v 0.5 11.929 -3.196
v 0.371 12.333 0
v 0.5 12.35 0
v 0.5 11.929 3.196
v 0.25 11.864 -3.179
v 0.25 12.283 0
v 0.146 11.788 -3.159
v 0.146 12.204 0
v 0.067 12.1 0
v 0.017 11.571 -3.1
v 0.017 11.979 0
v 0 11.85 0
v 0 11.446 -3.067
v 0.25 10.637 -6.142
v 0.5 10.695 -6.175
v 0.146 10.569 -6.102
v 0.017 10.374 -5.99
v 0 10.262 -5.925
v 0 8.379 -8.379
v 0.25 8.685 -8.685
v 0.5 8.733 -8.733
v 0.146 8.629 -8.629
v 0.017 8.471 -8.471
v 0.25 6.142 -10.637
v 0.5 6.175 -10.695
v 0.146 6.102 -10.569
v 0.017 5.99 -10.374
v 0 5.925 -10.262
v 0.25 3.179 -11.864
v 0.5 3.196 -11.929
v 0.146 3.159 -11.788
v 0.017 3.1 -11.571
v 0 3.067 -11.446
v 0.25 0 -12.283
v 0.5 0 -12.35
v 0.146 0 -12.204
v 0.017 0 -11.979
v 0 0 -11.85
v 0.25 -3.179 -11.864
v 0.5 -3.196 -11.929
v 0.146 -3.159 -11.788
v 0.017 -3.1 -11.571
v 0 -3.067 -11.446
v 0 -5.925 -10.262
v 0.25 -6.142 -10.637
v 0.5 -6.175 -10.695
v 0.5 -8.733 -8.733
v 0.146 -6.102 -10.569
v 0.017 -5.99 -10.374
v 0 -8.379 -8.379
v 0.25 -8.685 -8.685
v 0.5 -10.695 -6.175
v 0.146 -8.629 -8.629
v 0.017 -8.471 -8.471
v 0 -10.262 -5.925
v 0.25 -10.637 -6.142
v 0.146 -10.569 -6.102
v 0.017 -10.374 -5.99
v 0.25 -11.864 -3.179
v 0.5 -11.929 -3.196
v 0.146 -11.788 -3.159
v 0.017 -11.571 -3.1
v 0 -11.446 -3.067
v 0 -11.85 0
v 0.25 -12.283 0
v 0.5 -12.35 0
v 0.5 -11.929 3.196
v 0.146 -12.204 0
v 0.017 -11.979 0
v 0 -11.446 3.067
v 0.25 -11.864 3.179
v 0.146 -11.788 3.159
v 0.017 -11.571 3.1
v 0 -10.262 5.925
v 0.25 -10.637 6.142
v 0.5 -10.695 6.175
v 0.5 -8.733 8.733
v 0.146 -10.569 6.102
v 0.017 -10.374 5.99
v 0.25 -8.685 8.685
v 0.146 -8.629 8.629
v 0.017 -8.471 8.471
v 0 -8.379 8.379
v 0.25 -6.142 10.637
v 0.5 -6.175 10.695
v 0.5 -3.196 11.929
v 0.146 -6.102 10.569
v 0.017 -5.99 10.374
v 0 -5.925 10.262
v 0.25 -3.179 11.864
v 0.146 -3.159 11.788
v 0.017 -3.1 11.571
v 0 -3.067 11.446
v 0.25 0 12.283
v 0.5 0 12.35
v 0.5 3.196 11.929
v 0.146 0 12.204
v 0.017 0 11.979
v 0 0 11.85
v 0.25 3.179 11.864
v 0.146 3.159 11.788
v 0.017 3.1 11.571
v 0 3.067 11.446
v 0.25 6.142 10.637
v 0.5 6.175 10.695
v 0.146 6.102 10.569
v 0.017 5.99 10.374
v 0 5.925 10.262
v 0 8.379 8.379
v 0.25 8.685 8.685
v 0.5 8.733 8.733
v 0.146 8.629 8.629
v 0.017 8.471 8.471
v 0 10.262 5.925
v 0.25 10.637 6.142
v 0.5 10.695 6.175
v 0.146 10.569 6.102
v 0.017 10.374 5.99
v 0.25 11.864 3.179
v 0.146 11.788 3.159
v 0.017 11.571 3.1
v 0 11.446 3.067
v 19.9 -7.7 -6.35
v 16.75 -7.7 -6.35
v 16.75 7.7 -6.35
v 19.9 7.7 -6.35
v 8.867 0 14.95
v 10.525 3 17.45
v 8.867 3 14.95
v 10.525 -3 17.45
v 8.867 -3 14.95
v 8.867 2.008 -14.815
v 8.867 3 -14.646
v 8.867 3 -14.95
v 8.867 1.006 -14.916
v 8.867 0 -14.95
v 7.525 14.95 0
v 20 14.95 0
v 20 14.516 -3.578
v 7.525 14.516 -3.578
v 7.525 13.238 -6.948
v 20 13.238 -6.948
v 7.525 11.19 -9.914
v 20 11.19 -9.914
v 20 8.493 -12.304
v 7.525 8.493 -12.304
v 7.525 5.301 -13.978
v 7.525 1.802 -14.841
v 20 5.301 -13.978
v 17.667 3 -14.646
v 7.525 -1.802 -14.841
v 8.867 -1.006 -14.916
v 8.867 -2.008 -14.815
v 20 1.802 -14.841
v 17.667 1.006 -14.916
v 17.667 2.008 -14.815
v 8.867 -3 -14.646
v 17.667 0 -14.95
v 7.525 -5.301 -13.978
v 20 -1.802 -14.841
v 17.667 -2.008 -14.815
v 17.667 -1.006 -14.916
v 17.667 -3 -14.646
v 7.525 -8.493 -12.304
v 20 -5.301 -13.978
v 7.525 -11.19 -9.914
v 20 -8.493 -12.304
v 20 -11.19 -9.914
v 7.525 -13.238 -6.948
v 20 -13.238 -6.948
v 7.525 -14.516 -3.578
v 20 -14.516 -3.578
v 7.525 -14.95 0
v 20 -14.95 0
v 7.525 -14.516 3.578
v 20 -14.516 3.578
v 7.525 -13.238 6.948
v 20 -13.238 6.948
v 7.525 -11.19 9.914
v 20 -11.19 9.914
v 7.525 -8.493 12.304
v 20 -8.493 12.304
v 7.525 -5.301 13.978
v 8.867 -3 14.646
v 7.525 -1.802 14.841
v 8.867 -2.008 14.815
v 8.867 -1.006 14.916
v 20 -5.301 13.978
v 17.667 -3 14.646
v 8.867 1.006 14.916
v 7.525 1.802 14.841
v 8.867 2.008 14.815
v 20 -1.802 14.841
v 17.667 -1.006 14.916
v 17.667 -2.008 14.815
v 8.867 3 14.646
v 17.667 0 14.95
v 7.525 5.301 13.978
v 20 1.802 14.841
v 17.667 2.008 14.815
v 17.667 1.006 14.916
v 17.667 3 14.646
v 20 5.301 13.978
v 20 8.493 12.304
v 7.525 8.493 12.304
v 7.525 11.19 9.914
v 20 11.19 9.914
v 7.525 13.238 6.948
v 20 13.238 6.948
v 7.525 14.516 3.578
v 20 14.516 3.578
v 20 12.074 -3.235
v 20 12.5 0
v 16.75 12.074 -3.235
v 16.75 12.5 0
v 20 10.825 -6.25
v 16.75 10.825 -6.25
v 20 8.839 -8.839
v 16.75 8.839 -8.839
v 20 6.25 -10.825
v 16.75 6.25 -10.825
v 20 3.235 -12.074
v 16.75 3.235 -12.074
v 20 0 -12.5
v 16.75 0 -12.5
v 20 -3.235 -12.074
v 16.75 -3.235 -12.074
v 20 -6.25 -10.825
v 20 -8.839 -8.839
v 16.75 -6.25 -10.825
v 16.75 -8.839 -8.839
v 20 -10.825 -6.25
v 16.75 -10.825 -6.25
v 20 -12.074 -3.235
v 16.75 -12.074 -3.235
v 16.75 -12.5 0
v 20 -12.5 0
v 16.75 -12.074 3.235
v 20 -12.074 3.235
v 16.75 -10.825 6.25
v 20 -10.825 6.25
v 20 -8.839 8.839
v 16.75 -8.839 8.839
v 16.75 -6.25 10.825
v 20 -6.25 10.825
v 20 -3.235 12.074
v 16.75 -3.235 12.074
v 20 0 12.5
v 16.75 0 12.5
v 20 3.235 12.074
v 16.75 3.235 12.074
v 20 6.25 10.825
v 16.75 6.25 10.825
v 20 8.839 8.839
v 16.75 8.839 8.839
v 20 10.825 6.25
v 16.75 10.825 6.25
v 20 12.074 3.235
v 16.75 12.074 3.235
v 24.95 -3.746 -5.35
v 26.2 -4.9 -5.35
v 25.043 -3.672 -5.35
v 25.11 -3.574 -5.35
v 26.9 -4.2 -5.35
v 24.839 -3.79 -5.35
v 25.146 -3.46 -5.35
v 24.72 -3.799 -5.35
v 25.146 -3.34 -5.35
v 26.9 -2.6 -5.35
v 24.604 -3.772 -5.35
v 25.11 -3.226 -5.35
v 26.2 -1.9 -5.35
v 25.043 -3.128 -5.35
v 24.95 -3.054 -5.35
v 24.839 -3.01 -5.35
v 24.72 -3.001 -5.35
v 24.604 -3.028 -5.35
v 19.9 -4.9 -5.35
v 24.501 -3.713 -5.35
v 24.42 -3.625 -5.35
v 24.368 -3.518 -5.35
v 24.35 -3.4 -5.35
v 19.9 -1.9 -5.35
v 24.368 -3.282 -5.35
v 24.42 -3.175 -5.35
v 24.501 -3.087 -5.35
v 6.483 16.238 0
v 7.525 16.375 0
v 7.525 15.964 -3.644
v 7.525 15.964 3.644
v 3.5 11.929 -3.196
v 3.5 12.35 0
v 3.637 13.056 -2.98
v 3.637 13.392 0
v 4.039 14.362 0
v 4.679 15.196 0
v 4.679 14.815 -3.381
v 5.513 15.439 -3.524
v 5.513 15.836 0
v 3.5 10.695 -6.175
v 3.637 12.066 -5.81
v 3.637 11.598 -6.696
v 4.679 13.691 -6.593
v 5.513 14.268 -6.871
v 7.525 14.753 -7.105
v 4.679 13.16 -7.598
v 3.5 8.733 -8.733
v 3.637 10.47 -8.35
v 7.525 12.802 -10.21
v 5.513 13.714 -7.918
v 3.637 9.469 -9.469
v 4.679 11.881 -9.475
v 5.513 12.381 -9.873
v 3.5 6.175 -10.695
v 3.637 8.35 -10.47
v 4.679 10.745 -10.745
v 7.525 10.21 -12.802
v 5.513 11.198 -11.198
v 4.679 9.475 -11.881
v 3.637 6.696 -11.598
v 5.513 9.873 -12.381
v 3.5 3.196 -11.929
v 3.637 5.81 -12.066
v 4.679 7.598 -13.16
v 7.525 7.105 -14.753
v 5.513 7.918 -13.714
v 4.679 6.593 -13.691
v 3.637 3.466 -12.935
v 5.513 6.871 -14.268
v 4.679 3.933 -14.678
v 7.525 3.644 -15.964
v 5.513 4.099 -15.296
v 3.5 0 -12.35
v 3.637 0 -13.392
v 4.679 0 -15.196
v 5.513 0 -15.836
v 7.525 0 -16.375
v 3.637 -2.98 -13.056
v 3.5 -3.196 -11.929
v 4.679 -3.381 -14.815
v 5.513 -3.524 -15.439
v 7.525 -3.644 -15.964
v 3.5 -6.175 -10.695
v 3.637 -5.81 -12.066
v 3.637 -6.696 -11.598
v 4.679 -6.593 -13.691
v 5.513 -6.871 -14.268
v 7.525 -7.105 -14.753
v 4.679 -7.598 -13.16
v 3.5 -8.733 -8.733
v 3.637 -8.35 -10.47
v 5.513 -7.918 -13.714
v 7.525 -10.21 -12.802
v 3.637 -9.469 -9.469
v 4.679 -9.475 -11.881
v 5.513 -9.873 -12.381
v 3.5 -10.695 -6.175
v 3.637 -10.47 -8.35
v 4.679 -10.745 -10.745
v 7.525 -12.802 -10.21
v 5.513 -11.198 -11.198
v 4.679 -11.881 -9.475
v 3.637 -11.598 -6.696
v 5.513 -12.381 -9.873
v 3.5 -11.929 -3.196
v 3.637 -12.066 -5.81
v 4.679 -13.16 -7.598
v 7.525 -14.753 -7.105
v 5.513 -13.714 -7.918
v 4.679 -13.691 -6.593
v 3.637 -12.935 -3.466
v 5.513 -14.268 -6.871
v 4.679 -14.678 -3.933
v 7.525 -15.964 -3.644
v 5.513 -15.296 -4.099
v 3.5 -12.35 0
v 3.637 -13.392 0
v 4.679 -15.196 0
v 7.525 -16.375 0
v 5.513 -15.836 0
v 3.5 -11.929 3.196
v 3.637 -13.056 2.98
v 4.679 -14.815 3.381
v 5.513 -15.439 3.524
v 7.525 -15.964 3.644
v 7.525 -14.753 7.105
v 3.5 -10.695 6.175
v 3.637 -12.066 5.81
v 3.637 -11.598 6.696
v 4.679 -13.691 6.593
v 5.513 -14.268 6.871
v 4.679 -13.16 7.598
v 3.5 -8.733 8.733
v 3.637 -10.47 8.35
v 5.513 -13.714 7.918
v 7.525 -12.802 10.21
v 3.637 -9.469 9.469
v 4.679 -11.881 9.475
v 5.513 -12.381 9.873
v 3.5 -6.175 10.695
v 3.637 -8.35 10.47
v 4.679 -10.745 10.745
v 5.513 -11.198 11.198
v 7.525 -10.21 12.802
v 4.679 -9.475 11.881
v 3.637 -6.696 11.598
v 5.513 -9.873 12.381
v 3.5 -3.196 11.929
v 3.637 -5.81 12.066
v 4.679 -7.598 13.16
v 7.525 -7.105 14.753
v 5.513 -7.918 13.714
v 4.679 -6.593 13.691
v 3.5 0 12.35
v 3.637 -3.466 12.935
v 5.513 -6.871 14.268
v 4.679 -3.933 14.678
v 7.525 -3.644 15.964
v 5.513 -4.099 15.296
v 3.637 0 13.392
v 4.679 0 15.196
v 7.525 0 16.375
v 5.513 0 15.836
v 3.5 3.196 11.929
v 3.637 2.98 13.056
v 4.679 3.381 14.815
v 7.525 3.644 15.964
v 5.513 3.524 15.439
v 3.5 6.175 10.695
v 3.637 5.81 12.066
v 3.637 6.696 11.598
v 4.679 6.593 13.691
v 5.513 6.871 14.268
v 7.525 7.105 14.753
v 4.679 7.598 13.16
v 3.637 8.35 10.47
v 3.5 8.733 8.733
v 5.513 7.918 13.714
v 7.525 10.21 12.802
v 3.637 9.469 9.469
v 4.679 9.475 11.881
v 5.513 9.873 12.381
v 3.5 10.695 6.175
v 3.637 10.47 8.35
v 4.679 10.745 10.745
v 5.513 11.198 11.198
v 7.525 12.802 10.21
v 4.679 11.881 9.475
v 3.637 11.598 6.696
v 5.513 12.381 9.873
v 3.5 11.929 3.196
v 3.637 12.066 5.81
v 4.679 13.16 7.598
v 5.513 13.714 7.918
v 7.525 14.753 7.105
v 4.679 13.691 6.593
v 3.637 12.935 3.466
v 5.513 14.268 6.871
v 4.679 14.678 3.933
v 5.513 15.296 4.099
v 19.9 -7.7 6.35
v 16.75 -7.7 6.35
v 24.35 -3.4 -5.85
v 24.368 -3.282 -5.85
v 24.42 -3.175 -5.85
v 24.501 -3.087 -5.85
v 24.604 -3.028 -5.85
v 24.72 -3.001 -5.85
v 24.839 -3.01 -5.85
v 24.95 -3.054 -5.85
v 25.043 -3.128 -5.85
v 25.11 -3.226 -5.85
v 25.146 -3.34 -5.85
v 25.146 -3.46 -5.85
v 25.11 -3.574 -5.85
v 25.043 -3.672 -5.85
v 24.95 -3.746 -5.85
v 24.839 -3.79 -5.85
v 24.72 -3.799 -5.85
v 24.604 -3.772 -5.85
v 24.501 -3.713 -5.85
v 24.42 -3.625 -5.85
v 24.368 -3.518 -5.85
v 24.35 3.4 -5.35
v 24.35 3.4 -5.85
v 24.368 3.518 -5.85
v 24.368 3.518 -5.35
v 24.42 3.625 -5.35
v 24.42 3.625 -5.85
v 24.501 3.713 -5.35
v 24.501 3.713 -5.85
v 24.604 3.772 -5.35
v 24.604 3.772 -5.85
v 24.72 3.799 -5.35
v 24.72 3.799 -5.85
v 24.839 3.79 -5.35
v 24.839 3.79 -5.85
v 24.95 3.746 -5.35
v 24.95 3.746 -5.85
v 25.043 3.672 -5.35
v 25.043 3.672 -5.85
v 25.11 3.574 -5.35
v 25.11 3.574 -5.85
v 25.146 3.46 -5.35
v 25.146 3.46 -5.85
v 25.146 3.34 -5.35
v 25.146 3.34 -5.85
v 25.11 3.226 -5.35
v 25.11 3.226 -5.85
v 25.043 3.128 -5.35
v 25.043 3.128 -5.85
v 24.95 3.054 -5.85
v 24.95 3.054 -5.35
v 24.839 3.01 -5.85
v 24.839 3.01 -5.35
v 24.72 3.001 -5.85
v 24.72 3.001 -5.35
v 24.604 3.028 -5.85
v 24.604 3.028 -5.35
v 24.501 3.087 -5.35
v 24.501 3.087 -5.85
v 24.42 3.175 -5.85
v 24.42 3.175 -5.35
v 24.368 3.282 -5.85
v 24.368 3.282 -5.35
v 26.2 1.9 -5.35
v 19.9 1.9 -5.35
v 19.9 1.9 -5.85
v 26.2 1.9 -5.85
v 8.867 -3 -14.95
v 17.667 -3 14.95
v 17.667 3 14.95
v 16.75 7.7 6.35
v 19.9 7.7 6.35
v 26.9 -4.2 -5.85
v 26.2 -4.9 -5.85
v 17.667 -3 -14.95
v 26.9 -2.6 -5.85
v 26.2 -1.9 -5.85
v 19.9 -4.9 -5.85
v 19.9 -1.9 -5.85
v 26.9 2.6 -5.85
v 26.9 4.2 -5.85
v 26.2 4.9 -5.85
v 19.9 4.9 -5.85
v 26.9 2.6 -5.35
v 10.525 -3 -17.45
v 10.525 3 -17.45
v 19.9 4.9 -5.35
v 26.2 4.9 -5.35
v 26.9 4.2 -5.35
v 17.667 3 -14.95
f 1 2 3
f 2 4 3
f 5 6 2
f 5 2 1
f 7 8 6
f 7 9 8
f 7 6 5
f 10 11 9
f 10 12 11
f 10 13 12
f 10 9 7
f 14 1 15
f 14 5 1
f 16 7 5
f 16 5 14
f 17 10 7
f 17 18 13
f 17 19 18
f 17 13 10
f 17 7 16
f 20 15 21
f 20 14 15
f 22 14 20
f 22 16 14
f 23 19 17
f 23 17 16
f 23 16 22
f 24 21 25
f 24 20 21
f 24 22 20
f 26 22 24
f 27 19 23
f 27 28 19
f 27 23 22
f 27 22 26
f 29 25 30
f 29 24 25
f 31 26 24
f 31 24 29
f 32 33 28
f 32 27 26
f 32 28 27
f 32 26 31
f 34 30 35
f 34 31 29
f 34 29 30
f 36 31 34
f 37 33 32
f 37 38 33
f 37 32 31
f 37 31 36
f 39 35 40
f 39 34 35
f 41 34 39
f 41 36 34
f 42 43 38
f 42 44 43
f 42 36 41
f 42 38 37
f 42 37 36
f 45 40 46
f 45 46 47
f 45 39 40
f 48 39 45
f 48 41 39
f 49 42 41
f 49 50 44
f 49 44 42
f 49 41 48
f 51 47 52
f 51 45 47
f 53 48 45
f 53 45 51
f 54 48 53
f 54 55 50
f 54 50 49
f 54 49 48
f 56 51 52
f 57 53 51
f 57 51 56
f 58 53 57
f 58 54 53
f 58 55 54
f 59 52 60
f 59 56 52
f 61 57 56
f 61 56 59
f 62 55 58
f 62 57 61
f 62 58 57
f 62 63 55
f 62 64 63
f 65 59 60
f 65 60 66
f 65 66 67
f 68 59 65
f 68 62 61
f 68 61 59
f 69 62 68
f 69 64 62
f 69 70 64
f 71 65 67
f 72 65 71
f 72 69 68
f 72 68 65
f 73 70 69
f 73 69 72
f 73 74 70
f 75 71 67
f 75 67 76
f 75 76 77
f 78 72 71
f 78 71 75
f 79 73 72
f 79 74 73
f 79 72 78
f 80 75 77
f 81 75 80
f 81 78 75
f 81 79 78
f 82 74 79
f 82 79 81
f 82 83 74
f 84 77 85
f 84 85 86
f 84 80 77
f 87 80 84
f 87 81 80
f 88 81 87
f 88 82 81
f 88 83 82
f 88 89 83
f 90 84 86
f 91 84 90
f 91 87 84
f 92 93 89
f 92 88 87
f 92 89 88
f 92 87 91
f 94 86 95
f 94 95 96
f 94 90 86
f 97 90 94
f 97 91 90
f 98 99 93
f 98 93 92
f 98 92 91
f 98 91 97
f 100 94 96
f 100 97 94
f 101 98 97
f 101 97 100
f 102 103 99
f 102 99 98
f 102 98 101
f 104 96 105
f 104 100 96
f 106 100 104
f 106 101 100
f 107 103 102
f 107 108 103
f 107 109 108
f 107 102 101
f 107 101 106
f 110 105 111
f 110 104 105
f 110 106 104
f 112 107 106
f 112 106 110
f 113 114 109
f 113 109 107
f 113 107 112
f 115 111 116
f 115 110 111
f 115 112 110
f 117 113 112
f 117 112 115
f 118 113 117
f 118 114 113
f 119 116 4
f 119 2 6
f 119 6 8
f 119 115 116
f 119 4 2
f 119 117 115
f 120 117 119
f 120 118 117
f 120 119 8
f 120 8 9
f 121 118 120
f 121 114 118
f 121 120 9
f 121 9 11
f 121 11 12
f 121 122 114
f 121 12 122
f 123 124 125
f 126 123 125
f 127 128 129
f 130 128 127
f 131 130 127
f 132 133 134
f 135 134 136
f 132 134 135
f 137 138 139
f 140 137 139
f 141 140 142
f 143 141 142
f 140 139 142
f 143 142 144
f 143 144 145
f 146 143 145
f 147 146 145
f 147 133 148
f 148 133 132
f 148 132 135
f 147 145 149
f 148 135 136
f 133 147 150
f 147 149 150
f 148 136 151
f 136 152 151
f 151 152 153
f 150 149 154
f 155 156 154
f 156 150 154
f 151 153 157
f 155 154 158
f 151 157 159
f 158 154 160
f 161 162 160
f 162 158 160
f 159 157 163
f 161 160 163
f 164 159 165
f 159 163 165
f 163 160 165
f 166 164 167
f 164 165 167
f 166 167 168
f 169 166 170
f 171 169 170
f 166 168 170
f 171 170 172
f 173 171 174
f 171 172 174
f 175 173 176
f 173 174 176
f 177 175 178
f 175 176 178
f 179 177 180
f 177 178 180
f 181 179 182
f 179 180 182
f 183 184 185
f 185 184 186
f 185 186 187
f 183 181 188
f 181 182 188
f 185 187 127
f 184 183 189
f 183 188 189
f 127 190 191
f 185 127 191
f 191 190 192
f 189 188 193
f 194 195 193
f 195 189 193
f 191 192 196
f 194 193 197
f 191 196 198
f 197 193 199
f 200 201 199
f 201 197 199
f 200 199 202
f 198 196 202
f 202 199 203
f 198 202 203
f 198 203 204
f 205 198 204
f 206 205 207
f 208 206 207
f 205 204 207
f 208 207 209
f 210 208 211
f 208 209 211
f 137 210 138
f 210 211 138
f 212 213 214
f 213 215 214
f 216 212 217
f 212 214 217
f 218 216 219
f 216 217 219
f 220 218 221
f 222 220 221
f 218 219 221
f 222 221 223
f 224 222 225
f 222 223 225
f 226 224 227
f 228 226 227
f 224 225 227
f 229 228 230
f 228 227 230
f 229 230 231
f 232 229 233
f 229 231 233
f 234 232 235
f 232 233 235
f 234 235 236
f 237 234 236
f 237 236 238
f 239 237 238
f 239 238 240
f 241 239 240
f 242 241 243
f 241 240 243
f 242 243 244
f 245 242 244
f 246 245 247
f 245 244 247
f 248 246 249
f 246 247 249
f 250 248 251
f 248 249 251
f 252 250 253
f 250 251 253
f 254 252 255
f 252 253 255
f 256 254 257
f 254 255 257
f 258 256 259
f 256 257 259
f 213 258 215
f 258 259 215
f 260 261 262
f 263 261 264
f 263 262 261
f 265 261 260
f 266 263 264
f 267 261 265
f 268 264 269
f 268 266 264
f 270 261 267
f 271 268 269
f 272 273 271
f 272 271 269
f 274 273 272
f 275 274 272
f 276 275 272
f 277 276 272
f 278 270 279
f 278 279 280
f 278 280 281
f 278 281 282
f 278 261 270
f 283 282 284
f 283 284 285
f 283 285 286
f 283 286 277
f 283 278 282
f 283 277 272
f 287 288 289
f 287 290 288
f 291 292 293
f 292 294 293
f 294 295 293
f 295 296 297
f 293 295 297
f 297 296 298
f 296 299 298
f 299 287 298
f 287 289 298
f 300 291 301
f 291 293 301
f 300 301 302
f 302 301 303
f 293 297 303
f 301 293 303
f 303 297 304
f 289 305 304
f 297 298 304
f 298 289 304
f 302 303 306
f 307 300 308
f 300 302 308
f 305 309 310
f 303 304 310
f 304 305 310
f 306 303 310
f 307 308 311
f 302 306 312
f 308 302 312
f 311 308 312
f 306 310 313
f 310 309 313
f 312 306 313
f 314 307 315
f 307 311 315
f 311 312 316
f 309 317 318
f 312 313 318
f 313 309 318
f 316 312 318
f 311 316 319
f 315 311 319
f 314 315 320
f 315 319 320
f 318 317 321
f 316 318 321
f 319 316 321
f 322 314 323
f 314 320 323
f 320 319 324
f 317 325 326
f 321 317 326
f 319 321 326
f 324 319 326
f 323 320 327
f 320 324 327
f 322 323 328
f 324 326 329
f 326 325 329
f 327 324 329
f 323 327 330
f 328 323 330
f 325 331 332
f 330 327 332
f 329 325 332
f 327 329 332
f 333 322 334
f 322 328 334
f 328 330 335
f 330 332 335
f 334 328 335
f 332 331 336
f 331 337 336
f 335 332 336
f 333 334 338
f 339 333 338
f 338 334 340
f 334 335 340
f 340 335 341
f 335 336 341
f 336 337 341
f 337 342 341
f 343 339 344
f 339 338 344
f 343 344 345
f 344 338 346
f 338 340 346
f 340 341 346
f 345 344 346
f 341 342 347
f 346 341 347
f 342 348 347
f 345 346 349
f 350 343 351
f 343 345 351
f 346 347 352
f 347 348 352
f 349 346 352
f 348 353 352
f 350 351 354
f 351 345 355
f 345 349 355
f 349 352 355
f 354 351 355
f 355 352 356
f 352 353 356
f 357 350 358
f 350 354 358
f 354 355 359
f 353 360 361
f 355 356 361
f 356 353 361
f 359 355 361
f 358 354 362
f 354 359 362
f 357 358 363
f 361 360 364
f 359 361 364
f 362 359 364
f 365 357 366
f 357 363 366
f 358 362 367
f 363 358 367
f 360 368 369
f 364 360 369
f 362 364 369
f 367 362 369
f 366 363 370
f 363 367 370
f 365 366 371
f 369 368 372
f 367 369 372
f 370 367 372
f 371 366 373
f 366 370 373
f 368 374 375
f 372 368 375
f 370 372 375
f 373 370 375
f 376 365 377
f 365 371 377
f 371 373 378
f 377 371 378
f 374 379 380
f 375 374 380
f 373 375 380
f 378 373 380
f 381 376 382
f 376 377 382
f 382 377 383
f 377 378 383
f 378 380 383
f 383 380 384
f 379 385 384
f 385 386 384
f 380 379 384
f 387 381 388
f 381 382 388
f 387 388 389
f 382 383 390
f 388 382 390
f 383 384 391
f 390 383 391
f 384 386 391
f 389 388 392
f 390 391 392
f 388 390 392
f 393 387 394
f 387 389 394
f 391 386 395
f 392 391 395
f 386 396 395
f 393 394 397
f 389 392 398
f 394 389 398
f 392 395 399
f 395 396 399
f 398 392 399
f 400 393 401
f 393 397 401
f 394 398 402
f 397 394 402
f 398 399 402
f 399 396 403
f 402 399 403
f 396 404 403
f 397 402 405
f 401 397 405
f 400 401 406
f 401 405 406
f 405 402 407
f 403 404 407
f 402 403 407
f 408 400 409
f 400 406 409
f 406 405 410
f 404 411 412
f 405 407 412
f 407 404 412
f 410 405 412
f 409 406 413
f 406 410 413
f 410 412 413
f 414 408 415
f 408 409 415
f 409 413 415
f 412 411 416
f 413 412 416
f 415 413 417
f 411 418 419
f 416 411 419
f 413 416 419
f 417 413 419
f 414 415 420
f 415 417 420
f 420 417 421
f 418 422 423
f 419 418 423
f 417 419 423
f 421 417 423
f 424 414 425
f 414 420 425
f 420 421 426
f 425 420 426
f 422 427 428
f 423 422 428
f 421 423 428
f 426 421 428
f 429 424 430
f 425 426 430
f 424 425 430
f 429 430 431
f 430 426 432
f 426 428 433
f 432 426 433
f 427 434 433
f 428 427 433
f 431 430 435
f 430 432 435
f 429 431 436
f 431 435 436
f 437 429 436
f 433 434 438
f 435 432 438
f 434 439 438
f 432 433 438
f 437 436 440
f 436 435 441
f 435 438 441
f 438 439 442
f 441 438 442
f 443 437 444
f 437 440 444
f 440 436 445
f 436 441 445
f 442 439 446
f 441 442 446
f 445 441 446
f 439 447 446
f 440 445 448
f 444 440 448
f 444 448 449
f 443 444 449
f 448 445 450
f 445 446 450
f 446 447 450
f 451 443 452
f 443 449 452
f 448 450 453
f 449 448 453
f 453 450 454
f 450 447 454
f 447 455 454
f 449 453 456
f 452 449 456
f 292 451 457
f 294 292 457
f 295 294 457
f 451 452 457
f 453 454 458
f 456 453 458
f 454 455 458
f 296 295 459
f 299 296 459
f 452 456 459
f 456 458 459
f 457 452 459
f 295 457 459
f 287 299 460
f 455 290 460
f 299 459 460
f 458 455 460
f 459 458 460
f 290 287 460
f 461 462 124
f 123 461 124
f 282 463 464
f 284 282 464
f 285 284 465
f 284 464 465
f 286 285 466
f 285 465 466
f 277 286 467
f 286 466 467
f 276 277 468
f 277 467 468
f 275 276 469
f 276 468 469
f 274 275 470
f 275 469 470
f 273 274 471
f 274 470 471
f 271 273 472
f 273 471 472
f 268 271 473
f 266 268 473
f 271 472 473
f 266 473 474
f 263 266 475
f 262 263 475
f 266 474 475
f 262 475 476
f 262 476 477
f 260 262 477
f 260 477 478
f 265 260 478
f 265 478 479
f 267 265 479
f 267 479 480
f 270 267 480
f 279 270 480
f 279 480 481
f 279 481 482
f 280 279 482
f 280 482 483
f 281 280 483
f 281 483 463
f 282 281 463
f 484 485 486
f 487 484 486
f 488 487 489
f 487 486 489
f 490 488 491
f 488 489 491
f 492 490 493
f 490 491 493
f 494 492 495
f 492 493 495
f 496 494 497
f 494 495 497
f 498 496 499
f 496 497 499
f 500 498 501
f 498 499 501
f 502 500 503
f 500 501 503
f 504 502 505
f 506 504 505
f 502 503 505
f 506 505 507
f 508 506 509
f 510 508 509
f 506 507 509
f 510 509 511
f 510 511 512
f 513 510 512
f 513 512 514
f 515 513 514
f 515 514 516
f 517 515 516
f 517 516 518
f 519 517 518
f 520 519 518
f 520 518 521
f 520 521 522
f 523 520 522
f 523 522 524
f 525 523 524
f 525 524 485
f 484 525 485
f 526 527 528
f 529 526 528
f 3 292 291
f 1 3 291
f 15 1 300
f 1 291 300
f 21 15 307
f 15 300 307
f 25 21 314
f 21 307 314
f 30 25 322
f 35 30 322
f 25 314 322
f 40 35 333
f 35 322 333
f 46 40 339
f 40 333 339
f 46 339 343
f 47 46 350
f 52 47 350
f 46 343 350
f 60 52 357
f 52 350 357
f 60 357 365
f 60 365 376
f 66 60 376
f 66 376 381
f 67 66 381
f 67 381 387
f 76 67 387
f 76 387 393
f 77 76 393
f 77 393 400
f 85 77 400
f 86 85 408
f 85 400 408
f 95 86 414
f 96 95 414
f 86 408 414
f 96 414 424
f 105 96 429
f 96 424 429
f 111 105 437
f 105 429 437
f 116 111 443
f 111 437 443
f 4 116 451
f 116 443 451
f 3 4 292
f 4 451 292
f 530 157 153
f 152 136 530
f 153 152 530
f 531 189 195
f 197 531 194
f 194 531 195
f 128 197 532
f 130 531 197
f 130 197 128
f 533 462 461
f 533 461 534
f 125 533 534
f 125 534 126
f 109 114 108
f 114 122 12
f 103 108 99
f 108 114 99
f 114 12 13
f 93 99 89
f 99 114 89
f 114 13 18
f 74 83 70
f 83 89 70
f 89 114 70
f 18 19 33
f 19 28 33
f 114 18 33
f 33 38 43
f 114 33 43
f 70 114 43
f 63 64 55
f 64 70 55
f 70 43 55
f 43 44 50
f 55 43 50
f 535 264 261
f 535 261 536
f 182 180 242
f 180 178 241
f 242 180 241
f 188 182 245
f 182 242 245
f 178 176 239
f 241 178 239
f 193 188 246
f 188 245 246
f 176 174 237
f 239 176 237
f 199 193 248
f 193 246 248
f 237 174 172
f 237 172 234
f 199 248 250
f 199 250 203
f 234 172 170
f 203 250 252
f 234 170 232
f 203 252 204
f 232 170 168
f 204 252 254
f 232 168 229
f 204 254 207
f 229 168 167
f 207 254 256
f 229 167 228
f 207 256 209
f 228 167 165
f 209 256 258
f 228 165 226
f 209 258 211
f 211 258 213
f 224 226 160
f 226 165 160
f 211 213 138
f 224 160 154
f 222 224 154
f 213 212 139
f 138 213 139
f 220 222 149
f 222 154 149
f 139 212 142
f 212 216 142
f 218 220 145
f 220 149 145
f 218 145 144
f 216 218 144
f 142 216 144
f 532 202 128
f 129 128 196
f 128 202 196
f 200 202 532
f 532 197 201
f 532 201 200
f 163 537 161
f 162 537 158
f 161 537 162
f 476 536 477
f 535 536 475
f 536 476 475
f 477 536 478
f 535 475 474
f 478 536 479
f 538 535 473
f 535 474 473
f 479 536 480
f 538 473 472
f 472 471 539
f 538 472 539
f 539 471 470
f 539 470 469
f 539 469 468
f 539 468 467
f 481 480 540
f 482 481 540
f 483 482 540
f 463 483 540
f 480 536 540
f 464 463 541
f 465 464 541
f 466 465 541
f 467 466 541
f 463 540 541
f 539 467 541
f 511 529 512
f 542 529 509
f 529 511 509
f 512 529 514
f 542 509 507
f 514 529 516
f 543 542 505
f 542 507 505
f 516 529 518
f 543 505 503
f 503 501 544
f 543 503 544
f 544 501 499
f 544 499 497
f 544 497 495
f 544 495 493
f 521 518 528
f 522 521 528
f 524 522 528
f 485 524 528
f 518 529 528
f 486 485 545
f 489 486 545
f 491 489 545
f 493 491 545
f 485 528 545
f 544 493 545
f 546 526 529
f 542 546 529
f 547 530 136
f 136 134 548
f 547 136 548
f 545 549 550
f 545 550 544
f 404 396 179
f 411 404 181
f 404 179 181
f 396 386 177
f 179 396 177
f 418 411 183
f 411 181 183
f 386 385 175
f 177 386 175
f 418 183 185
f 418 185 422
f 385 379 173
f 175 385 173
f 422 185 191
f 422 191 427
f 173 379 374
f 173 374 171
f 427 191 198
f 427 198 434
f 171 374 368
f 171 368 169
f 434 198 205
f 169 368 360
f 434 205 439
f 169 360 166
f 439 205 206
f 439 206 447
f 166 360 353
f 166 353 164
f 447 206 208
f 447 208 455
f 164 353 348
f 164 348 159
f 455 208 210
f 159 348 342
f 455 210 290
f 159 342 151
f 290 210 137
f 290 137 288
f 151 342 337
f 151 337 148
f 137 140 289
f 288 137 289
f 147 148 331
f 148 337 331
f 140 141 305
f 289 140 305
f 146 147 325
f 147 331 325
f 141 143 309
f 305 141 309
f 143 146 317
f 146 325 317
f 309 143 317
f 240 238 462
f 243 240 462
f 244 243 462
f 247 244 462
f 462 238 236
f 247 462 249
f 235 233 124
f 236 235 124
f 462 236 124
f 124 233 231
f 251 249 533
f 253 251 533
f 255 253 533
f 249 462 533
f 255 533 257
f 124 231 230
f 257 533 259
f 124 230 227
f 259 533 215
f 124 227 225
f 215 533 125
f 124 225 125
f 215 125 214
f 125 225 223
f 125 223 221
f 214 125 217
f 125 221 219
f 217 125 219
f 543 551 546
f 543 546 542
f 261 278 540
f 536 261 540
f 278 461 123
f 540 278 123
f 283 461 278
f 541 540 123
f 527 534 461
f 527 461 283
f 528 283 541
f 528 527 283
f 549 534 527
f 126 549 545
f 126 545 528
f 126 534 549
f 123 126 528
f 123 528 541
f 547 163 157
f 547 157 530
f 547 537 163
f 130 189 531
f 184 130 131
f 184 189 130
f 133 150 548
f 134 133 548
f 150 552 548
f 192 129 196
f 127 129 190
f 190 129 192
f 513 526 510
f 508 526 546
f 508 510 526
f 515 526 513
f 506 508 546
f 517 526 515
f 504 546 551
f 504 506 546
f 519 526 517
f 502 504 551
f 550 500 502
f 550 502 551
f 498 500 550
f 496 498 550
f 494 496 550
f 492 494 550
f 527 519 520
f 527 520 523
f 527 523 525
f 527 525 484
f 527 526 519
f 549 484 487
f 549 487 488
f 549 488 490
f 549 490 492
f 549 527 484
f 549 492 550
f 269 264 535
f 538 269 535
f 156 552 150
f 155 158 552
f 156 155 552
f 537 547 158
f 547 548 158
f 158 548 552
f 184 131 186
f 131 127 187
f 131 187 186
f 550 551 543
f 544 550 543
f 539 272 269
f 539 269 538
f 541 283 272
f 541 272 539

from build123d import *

# Parameters (mm, degrees)
SKETCH2_W           = 12.7
SKETCH2_H           = 15.4
BOSS_EXTRUDE1_DEPTH = 3.15
SKETCH3_W           = 0.5
SKETCH3_H           = 3
BOSS_EXTRUDE2_DEPTH = 7
SKETCH4_R           = 0.4
CUT_EXTRUDE1_DEPTH  = 23.225
CHAMFER1_SIZE       = 0.7
BOSS_EXTRUDE3_DEPTH = 3
FILLET1_R           = 0.5


with BuildPart() as part:
    # Sketch1 → Revolve1 (revolve)
    with BuildSketch(Plane.XY):
        with BuildLine():
            Line((0, 0), (0, 12.35))
            Line((0, 12.35), (3.5, 12.35))
            ThreePointArc((3.5, 12.35), (4.678895206, 15.196104794), (7.525, 16.375))
            Line((7.525, 16.375), (7.525, 14.95))
            Line((7.525, 14.95), (20, 14.95))
            Line((20, 14.95), (20, 12.5))
            Line((20, 12.5), (16.75, 12.5))
            Line((16.75, 12.5), (16.75, 0))
            Line((16.75, 0), (0, 0))
        make_face()
    revolve(axis=Axis((16.75, 0, 0), (-1, 0, 0)))

    # Sketch2 → Boss-Extrude1 (add)
    with BuildSketch(Plane(origin=(16.75, 0, 0), x_dir=(0, 0, -1), z_dir=(1, 0, 0))):
        Rectangle(SKETCH2_W, SKETCH2_H)
    extrude(amount=BOSS_EXTRUDE1_DEPTH)

    # Sketch3 → Boss-Extrude2 (add)
    with BuildSketch(Plane(origin=(19.9, 0, 0), x_dir=(0, 0, -1), z_dir=(1, 0, 0))):
        with Locations((5.6, 3.4)):
            Rectangle(SKETCH3_W, SKETCH3_H)
        with Locations((5.6, -3.4)):
            Rectangle(SKETCH3_W, SKETCH3_H)
    extrude(amount=BOSS_EXTRUDE2_DEPTH)

    # Sketch4 → Cut-Extrude1 (cut, through all)
    with BuildSketch(Plane(origin=(0, 0, -5.85), x_dir=(-1, 0, 0), z_dir=(0, 0, -1))):
        with Locations((-24.75, 3.4)):
            Circle(SKETCH4_R)
        with Locations((-24.75, -3.4)):
            Circle(SKETCH4_R)
    extrude(amount=-CUT_EXTRUDE1_DEPTH, mode=Mode.SUBTRACT)

    # Chamfer1
    chamfer1_edges = [part.edges().sort_by_distance(p)[0] for p in [
        (26.9, 1.9, -5.6),
        (26.9, 4.9, -5.6),
        (26.9, -4.9, -5.6),
        (26.9, -1.9, -5.6),
    ]]
    chamfer(chamfer1_edges, length=CHAMFER1_SIZE)

    # Sketch5 → Boss-Extrude3 (add, symmetric)
    with BuildSketch(Plane(origin=(0, 0, 0), x_dir=(1, 0, 0), z_dir=(0, 1, 0))):
        Polygon((17.666687605, -14.95), (10.525, -17.45), (8.866687605, -14.95), (8.866687605, -13.95), (17.666687605, -13.95), align=None)
        Polygon((8.866687605, 13.95), (8.866687605, 14.95), (10.525, 17.45), (17.666687605, 14.95), (17.666687605, 13.95), align=None)
    extrude(amount=BOSS_EXTRUDE3_DEPTH, both=True)

    # Fillet1
    fillet1_edges = [part.edges().sort_by_distance(p)[0] for p in [
        (0, -12.35, 0),
    ]]
    fillet(fillet1_edges, radius=FILLET1_R)


solid = part.part
